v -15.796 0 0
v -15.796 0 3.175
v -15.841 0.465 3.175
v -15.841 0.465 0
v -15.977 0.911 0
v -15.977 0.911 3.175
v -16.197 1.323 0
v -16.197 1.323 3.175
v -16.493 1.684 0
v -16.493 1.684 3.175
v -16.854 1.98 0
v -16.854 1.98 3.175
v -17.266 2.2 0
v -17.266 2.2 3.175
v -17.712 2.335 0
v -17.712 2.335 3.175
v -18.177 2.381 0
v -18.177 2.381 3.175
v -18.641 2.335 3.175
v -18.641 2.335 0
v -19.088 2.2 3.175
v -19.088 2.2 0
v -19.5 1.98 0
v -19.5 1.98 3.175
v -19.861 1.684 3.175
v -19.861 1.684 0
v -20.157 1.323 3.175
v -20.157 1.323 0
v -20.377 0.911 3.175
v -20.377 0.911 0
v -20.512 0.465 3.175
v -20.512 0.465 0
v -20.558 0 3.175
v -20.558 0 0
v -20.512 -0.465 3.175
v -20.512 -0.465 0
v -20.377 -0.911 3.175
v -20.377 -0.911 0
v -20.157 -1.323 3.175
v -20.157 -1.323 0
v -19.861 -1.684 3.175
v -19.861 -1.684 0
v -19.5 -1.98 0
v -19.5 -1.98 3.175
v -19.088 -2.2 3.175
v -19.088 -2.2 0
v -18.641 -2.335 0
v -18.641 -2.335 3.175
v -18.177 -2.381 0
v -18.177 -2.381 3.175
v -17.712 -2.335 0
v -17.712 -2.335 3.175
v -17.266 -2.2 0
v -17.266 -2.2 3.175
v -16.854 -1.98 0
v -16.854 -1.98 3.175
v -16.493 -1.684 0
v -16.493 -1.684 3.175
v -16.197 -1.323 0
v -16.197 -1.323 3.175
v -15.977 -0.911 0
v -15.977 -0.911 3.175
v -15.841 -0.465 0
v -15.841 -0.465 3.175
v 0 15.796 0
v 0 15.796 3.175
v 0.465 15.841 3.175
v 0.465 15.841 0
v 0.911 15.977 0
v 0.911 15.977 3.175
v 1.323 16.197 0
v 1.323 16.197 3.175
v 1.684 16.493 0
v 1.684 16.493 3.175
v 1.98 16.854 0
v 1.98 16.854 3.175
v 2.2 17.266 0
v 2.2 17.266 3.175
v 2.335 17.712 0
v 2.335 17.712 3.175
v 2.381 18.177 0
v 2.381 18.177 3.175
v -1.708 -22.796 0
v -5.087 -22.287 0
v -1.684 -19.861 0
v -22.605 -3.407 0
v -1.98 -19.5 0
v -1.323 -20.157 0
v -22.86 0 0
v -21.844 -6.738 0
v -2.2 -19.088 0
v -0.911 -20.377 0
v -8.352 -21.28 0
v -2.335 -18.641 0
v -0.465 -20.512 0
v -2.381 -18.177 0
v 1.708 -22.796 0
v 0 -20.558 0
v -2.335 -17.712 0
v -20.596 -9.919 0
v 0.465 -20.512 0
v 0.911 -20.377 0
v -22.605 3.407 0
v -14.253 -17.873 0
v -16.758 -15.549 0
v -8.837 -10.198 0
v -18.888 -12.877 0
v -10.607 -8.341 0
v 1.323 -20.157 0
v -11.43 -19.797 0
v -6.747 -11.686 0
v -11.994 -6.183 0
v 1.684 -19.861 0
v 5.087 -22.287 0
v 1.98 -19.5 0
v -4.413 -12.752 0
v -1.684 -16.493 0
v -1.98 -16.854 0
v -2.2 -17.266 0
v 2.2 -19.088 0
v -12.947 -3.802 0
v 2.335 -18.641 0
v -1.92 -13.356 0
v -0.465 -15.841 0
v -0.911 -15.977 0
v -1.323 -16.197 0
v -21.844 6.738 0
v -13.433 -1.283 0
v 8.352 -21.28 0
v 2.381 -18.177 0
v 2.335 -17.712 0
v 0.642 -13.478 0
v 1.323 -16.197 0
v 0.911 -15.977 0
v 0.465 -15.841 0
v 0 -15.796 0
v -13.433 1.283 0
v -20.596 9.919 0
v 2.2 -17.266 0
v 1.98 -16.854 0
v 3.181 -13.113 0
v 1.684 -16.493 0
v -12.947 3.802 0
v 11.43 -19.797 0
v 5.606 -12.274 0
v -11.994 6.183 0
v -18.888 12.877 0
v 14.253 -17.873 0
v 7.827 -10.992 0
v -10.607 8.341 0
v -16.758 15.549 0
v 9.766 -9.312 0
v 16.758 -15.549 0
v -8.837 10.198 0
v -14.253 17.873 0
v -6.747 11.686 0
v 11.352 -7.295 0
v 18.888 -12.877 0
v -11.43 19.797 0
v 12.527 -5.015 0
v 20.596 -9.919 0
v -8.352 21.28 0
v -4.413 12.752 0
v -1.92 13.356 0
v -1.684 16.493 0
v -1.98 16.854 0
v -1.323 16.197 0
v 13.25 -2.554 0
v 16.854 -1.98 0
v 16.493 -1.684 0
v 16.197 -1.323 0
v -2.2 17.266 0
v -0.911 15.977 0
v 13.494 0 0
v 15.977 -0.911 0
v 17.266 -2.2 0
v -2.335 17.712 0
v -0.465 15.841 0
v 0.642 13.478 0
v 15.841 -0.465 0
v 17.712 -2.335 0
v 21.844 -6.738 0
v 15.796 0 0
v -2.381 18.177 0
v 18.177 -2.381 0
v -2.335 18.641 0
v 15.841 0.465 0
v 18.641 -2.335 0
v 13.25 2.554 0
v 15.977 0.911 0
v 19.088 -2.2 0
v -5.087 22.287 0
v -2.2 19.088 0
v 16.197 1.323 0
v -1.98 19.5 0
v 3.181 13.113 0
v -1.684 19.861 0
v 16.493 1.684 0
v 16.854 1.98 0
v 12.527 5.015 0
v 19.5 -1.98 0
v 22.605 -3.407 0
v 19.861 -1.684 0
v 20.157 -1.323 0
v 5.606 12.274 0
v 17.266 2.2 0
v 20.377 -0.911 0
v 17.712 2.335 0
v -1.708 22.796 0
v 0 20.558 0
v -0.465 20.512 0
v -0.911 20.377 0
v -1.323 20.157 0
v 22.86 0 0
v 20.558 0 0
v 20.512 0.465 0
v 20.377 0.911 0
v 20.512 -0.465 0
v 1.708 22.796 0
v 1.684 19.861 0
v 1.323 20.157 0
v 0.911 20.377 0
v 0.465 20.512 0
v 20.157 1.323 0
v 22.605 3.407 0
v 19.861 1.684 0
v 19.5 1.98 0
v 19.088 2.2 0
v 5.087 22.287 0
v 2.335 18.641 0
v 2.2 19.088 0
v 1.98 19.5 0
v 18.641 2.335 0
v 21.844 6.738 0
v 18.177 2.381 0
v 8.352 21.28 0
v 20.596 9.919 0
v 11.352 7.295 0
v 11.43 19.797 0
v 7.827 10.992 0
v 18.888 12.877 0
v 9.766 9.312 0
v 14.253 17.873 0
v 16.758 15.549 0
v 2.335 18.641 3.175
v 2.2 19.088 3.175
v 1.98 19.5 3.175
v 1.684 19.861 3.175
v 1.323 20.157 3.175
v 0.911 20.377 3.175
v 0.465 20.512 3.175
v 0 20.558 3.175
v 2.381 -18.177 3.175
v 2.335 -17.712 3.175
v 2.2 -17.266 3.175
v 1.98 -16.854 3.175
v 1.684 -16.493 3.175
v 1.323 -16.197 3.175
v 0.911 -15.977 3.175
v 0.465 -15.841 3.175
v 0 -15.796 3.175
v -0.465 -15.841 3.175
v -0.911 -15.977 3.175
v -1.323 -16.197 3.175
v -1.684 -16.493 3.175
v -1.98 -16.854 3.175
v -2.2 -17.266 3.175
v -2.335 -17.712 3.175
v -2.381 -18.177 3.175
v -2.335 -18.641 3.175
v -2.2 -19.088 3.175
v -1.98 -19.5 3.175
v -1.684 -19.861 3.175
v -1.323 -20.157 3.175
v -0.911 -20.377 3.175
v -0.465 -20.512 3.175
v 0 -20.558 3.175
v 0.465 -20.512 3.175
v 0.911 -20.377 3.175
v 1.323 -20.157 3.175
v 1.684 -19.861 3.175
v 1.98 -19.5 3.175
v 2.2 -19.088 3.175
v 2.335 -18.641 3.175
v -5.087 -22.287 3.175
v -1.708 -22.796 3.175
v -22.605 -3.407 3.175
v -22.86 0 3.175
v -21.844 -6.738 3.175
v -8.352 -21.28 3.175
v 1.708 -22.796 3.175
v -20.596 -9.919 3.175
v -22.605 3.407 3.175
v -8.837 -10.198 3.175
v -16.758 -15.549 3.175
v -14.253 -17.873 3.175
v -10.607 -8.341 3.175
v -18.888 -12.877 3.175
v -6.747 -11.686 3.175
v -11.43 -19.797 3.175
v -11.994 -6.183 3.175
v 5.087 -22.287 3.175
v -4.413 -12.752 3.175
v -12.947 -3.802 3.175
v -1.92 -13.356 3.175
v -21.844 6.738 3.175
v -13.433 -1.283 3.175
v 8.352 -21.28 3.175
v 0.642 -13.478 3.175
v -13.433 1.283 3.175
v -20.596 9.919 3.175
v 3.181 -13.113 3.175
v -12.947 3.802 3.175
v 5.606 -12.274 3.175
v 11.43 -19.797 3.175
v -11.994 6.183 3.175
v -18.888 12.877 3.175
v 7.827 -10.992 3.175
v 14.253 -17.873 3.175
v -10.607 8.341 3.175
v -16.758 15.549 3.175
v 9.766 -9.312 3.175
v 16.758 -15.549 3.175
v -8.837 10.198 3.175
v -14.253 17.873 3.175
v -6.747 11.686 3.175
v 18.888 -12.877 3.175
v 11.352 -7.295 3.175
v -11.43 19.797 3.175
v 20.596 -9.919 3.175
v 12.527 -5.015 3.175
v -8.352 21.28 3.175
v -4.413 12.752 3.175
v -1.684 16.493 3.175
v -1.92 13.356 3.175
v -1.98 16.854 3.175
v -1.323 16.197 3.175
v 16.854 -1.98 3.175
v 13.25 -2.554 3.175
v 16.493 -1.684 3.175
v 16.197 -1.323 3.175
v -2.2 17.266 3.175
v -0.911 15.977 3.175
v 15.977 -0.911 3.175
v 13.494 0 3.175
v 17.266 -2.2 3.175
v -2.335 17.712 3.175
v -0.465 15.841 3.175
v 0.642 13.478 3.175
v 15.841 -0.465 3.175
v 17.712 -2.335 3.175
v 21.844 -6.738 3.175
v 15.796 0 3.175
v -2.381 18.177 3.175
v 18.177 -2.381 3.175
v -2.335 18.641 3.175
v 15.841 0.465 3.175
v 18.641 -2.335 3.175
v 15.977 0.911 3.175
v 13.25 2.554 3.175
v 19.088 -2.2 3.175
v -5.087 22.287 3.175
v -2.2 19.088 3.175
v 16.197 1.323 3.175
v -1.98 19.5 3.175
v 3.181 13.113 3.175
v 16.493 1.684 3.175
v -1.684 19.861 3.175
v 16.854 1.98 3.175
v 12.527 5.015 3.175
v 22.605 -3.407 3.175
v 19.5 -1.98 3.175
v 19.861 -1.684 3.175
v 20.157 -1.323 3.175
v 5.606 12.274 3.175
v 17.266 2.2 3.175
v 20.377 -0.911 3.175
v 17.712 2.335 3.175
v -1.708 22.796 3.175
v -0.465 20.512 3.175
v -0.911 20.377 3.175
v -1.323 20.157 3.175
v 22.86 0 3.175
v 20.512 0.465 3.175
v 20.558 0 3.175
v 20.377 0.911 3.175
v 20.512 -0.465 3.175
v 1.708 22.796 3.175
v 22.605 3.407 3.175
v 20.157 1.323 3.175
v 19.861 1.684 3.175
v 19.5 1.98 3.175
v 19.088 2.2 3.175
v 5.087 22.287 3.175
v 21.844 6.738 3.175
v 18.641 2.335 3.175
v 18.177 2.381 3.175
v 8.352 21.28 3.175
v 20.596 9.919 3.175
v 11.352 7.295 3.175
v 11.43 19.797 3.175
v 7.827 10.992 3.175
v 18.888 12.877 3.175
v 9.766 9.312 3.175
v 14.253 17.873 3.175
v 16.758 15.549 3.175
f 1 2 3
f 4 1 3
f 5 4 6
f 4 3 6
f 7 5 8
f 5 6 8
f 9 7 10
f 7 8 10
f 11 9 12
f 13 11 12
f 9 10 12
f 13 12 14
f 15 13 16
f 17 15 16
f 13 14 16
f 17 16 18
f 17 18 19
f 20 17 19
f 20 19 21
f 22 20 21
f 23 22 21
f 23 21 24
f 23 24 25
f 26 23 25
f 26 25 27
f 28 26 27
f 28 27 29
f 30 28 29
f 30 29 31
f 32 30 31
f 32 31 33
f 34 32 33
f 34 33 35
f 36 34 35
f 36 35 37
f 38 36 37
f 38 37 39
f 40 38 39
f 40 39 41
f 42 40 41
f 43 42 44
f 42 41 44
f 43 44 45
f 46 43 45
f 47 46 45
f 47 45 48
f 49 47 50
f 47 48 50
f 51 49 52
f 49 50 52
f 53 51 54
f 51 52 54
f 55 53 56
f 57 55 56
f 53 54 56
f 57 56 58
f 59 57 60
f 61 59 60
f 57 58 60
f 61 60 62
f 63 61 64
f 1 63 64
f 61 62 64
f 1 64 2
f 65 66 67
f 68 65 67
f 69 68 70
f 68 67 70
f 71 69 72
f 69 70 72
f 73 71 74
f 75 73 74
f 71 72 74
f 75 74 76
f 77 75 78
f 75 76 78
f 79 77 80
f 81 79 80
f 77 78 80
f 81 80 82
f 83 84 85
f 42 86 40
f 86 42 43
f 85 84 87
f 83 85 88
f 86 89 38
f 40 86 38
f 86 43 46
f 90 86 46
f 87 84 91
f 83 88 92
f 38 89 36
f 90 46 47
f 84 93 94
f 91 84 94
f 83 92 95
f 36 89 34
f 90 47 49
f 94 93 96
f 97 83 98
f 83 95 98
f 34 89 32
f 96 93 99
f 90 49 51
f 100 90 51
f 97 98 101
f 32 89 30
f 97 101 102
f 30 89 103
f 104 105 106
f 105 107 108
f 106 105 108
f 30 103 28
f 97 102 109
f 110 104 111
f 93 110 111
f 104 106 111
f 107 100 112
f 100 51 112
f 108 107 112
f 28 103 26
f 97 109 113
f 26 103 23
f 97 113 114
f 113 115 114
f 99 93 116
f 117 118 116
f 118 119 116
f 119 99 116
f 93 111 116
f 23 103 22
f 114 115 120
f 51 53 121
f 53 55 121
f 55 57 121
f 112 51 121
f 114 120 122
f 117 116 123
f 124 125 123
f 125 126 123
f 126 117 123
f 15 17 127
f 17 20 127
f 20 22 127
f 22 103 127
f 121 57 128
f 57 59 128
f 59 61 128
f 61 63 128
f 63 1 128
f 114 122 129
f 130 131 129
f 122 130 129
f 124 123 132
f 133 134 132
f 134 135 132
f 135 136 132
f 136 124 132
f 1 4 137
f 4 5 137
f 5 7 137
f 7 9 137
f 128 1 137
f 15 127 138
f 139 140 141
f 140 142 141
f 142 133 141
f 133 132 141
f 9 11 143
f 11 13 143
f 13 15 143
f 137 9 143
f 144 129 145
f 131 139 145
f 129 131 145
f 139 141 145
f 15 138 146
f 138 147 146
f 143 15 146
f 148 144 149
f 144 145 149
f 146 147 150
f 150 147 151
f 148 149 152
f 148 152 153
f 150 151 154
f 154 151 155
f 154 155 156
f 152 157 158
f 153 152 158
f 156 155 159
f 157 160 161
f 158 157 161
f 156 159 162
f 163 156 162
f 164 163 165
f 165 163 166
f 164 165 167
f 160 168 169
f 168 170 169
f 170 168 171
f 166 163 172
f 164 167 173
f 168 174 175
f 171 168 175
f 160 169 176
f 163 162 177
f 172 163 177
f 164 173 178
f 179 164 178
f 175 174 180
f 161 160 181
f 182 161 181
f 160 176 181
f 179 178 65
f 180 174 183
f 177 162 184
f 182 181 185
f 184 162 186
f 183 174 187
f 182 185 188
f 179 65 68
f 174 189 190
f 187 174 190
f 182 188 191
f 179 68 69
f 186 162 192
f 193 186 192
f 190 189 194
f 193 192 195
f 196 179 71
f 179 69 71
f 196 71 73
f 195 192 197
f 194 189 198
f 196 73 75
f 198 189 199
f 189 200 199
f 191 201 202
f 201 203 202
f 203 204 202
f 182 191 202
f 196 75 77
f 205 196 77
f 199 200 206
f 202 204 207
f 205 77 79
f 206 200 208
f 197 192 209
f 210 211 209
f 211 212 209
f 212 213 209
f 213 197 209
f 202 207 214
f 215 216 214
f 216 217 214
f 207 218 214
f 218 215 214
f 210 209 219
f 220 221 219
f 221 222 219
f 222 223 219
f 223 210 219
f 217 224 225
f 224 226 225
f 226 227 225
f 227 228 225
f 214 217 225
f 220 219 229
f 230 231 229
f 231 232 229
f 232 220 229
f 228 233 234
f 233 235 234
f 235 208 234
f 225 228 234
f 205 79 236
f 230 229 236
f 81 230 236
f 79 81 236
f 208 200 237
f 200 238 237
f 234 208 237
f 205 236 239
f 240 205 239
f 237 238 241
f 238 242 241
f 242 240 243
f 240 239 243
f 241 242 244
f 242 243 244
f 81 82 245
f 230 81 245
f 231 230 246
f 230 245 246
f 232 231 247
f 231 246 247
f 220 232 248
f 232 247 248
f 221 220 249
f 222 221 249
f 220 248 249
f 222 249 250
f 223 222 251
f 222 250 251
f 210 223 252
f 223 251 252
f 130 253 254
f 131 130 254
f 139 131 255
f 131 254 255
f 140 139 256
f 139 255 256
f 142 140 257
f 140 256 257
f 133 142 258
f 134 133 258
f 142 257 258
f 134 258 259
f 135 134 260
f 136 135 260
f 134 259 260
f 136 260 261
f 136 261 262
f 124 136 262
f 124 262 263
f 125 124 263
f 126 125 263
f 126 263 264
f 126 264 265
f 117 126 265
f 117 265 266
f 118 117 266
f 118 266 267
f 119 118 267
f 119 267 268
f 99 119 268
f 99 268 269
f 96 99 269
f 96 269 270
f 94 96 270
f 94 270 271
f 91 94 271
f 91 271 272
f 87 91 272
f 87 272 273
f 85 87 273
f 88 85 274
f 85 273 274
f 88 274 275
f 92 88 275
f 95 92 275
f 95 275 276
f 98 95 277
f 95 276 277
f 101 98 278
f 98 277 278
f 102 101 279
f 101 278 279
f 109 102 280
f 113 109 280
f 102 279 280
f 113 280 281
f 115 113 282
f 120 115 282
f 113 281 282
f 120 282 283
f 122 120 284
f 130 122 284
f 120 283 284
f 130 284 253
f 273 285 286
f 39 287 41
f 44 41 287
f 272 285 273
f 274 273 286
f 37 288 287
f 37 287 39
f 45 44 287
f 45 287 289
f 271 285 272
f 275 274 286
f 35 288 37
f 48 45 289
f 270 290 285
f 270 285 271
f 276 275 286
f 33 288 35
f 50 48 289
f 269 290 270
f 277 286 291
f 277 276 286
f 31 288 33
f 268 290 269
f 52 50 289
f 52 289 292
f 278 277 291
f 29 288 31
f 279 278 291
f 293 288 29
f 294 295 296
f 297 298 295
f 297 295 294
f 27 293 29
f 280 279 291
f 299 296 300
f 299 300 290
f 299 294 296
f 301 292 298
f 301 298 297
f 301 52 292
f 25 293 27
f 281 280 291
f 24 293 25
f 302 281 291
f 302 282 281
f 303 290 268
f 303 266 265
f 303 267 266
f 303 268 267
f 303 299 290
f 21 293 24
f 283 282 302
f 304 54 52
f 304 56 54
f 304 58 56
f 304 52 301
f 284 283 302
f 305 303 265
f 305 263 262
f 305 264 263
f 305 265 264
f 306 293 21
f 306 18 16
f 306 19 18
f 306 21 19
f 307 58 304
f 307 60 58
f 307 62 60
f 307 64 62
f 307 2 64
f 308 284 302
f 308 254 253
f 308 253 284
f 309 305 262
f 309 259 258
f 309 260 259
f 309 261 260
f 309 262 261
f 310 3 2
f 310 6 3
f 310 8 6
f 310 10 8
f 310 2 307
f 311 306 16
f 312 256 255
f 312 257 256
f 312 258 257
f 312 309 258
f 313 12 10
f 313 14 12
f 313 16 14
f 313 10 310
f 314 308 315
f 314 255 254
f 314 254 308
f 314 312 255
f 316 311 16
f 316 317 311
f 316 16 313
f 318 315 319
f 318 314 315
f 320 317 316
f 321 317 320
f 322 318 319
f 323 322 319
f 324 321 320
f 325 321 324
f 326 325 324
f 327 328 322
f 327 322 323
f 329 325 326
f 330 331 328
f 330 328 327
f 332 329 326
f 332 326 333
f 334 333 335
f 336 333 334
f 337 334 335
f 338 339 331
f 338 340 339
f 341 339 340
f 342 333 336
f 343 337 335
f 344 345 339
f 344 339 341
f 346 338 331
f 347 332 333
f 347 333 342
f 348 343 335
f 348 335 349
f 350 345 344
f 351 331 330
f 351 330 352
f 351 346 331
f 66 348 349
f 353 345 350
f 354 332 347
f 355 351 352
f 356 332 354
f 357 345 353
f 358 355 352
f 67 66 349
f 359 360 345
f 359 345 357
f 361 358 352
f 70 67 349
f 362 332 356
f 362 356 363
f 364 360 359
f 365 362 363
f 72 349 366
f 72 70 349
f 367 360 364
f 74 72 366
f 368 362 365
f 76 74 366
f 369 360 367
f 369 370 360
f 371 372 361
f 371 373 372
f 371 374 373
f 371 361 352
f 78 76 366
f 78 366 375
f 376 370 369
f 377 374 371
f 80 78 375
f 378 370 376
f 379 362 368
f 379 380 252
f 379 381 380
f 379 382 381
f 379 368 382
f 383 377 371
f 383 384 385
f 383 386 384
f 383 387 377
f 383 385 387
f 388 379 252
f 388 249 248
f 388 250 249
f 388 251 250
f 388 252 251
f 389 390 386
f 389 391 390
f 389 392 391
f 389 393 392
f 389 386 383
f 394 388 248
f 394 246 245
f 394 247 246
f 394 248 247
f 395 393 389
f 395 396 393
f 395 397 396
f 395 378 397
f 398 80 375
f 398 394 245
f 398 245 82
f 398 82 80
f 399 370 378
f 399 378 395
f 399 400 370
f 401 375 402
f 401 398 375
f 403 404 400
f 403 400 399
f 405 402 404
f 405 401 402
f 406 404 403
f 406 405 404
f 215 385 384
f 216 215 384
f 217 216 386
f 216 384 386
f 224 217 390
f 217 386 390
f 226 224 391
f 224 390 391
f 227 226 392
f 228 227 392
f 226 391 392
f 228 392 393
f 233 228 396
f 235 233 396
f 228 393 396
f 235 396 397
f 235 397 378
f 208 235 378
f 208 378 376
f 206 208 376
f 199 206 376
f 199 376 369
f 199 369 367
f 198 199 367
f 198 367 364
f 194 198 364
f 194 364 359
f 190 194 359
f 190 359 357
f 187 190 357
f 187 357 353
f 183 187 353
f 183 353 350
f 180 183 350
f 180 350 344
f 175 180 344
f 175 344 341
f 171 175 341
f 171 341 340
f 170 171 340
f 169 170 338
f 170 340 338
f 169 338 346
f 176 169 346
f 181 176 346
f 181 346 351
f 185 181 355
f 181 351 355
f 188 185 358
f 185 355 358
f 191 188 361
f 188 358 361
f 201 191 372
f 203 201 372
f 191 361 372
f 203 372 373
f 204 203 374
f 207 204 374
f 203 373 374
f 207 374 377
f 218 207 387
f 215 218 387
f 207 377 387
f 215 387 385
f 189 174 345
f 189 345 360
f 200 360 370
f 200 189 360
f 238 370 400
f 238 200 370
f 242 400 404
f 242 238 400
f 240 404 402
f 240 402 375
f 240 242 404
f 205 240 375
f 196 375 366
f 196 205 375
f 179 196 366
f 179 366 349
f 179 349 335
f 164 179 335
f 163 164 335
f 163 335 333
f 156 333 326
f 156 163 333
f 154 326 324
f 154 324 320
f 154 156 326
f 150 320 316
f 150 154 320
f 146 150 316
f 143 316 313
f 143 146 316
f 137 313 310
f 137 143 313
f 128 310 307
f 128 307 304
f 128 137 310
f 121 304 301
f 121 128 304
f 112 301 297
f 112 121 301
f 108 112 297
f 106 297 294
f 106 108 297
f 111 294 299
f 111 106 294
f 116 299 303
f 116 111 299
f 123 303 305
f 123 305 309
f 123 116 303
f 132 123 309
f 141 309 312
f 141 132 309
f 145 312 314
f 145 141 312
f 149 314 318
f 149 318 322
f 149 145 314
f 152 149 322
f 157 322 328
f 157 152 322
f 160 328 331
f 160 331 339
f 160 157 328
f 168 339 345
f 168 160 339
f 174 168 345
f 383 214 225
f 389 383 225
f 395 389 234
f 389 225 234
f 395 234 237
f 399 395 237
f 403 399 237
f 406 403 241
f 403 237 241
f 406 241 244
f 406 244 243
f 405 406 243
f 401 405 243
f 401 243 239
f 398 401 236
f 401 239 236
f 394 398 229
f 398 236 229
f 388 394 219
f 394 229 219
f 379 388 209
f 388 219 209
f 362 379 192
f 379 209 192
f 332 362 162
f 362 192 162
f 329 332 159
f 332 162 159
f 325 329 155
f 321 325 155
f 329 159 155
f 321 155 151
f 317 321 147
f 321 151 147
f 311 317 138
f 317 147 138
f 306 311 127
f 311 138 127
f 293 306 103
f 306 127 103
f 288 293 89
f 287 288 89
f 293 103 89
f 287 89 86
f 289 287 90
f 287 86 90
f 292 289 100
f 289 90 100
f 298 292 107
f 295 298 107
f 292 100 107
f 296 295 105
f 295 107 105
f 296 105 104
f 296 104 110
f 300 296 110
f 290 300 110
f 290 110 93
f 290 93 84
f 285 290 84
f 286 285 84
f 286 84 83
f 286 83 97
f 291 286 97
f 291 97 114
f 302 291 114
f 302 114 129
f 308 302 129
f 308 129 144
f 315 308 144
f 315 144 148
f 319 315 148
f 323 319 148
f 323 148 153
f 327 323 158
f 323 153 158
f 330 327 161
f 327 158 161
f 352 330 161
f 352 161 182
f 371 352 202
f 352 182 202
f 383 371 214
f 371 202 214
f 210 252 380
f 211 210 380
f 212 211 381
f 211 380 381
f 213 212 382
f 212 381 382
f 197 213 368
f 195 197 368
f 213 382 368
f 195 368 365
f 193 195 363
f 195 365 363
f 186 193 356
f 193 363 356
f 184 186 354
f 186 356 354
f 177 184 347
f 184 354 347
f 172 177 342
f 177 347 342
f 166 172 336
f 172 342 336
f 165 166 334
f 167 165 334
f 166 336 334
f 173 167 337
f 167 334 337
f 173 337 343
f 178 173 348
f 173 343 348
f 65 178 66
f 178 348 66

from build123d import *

# Parameters (mm, degrees)
F0_R     = 22.86
F0_R_2   = 13.49375
F1_DEPTH = 3.175
F2_R     = 2.38125
F3_DEPTH = 25.4


with BuildPart() as f1:
    # F0 (on Top) → F1 (new body)
    with BuildSketch(Plane.XY):
        Circle(F0_R)
        Circle(F0_R_2, mode=Mode.SUBTRACT)
    extrude(amount=F1_DEPTH)

    # F2 (on face) → F3 (cut)
    with BuildSketch(Plane.XY.offset(3.175)):
        with BuildLine():
            ThreePointArc((2.38125, 18.176875), (1.683798, 19.860673), (0, 20.558125))
            Line((0, 20.558125), (0, 15.795625))
            ThreePointArc((0, 15.795625), (1.683798, 16.493077), (2.38125, 18.176875))
        make_face()
        with BuildLine():
            Line((0, 15.795625), (0, 20.558125))
            ThreePointArc((0, 20.558125), (-2.38125, 18.176875), (0, 15.795625))
        make_face()
        with Locations((-18.176875, 0)):
            Circle(F2_R)
        with Locations((0, -18.176875)):
            Circle(F2_R)
        with Locations((18.176875, 0)):
            Circle(F2_R)
    extrude(amount=-F3_DEPTH, mode=Mode.SUBTRACT)


solid = f1.part
